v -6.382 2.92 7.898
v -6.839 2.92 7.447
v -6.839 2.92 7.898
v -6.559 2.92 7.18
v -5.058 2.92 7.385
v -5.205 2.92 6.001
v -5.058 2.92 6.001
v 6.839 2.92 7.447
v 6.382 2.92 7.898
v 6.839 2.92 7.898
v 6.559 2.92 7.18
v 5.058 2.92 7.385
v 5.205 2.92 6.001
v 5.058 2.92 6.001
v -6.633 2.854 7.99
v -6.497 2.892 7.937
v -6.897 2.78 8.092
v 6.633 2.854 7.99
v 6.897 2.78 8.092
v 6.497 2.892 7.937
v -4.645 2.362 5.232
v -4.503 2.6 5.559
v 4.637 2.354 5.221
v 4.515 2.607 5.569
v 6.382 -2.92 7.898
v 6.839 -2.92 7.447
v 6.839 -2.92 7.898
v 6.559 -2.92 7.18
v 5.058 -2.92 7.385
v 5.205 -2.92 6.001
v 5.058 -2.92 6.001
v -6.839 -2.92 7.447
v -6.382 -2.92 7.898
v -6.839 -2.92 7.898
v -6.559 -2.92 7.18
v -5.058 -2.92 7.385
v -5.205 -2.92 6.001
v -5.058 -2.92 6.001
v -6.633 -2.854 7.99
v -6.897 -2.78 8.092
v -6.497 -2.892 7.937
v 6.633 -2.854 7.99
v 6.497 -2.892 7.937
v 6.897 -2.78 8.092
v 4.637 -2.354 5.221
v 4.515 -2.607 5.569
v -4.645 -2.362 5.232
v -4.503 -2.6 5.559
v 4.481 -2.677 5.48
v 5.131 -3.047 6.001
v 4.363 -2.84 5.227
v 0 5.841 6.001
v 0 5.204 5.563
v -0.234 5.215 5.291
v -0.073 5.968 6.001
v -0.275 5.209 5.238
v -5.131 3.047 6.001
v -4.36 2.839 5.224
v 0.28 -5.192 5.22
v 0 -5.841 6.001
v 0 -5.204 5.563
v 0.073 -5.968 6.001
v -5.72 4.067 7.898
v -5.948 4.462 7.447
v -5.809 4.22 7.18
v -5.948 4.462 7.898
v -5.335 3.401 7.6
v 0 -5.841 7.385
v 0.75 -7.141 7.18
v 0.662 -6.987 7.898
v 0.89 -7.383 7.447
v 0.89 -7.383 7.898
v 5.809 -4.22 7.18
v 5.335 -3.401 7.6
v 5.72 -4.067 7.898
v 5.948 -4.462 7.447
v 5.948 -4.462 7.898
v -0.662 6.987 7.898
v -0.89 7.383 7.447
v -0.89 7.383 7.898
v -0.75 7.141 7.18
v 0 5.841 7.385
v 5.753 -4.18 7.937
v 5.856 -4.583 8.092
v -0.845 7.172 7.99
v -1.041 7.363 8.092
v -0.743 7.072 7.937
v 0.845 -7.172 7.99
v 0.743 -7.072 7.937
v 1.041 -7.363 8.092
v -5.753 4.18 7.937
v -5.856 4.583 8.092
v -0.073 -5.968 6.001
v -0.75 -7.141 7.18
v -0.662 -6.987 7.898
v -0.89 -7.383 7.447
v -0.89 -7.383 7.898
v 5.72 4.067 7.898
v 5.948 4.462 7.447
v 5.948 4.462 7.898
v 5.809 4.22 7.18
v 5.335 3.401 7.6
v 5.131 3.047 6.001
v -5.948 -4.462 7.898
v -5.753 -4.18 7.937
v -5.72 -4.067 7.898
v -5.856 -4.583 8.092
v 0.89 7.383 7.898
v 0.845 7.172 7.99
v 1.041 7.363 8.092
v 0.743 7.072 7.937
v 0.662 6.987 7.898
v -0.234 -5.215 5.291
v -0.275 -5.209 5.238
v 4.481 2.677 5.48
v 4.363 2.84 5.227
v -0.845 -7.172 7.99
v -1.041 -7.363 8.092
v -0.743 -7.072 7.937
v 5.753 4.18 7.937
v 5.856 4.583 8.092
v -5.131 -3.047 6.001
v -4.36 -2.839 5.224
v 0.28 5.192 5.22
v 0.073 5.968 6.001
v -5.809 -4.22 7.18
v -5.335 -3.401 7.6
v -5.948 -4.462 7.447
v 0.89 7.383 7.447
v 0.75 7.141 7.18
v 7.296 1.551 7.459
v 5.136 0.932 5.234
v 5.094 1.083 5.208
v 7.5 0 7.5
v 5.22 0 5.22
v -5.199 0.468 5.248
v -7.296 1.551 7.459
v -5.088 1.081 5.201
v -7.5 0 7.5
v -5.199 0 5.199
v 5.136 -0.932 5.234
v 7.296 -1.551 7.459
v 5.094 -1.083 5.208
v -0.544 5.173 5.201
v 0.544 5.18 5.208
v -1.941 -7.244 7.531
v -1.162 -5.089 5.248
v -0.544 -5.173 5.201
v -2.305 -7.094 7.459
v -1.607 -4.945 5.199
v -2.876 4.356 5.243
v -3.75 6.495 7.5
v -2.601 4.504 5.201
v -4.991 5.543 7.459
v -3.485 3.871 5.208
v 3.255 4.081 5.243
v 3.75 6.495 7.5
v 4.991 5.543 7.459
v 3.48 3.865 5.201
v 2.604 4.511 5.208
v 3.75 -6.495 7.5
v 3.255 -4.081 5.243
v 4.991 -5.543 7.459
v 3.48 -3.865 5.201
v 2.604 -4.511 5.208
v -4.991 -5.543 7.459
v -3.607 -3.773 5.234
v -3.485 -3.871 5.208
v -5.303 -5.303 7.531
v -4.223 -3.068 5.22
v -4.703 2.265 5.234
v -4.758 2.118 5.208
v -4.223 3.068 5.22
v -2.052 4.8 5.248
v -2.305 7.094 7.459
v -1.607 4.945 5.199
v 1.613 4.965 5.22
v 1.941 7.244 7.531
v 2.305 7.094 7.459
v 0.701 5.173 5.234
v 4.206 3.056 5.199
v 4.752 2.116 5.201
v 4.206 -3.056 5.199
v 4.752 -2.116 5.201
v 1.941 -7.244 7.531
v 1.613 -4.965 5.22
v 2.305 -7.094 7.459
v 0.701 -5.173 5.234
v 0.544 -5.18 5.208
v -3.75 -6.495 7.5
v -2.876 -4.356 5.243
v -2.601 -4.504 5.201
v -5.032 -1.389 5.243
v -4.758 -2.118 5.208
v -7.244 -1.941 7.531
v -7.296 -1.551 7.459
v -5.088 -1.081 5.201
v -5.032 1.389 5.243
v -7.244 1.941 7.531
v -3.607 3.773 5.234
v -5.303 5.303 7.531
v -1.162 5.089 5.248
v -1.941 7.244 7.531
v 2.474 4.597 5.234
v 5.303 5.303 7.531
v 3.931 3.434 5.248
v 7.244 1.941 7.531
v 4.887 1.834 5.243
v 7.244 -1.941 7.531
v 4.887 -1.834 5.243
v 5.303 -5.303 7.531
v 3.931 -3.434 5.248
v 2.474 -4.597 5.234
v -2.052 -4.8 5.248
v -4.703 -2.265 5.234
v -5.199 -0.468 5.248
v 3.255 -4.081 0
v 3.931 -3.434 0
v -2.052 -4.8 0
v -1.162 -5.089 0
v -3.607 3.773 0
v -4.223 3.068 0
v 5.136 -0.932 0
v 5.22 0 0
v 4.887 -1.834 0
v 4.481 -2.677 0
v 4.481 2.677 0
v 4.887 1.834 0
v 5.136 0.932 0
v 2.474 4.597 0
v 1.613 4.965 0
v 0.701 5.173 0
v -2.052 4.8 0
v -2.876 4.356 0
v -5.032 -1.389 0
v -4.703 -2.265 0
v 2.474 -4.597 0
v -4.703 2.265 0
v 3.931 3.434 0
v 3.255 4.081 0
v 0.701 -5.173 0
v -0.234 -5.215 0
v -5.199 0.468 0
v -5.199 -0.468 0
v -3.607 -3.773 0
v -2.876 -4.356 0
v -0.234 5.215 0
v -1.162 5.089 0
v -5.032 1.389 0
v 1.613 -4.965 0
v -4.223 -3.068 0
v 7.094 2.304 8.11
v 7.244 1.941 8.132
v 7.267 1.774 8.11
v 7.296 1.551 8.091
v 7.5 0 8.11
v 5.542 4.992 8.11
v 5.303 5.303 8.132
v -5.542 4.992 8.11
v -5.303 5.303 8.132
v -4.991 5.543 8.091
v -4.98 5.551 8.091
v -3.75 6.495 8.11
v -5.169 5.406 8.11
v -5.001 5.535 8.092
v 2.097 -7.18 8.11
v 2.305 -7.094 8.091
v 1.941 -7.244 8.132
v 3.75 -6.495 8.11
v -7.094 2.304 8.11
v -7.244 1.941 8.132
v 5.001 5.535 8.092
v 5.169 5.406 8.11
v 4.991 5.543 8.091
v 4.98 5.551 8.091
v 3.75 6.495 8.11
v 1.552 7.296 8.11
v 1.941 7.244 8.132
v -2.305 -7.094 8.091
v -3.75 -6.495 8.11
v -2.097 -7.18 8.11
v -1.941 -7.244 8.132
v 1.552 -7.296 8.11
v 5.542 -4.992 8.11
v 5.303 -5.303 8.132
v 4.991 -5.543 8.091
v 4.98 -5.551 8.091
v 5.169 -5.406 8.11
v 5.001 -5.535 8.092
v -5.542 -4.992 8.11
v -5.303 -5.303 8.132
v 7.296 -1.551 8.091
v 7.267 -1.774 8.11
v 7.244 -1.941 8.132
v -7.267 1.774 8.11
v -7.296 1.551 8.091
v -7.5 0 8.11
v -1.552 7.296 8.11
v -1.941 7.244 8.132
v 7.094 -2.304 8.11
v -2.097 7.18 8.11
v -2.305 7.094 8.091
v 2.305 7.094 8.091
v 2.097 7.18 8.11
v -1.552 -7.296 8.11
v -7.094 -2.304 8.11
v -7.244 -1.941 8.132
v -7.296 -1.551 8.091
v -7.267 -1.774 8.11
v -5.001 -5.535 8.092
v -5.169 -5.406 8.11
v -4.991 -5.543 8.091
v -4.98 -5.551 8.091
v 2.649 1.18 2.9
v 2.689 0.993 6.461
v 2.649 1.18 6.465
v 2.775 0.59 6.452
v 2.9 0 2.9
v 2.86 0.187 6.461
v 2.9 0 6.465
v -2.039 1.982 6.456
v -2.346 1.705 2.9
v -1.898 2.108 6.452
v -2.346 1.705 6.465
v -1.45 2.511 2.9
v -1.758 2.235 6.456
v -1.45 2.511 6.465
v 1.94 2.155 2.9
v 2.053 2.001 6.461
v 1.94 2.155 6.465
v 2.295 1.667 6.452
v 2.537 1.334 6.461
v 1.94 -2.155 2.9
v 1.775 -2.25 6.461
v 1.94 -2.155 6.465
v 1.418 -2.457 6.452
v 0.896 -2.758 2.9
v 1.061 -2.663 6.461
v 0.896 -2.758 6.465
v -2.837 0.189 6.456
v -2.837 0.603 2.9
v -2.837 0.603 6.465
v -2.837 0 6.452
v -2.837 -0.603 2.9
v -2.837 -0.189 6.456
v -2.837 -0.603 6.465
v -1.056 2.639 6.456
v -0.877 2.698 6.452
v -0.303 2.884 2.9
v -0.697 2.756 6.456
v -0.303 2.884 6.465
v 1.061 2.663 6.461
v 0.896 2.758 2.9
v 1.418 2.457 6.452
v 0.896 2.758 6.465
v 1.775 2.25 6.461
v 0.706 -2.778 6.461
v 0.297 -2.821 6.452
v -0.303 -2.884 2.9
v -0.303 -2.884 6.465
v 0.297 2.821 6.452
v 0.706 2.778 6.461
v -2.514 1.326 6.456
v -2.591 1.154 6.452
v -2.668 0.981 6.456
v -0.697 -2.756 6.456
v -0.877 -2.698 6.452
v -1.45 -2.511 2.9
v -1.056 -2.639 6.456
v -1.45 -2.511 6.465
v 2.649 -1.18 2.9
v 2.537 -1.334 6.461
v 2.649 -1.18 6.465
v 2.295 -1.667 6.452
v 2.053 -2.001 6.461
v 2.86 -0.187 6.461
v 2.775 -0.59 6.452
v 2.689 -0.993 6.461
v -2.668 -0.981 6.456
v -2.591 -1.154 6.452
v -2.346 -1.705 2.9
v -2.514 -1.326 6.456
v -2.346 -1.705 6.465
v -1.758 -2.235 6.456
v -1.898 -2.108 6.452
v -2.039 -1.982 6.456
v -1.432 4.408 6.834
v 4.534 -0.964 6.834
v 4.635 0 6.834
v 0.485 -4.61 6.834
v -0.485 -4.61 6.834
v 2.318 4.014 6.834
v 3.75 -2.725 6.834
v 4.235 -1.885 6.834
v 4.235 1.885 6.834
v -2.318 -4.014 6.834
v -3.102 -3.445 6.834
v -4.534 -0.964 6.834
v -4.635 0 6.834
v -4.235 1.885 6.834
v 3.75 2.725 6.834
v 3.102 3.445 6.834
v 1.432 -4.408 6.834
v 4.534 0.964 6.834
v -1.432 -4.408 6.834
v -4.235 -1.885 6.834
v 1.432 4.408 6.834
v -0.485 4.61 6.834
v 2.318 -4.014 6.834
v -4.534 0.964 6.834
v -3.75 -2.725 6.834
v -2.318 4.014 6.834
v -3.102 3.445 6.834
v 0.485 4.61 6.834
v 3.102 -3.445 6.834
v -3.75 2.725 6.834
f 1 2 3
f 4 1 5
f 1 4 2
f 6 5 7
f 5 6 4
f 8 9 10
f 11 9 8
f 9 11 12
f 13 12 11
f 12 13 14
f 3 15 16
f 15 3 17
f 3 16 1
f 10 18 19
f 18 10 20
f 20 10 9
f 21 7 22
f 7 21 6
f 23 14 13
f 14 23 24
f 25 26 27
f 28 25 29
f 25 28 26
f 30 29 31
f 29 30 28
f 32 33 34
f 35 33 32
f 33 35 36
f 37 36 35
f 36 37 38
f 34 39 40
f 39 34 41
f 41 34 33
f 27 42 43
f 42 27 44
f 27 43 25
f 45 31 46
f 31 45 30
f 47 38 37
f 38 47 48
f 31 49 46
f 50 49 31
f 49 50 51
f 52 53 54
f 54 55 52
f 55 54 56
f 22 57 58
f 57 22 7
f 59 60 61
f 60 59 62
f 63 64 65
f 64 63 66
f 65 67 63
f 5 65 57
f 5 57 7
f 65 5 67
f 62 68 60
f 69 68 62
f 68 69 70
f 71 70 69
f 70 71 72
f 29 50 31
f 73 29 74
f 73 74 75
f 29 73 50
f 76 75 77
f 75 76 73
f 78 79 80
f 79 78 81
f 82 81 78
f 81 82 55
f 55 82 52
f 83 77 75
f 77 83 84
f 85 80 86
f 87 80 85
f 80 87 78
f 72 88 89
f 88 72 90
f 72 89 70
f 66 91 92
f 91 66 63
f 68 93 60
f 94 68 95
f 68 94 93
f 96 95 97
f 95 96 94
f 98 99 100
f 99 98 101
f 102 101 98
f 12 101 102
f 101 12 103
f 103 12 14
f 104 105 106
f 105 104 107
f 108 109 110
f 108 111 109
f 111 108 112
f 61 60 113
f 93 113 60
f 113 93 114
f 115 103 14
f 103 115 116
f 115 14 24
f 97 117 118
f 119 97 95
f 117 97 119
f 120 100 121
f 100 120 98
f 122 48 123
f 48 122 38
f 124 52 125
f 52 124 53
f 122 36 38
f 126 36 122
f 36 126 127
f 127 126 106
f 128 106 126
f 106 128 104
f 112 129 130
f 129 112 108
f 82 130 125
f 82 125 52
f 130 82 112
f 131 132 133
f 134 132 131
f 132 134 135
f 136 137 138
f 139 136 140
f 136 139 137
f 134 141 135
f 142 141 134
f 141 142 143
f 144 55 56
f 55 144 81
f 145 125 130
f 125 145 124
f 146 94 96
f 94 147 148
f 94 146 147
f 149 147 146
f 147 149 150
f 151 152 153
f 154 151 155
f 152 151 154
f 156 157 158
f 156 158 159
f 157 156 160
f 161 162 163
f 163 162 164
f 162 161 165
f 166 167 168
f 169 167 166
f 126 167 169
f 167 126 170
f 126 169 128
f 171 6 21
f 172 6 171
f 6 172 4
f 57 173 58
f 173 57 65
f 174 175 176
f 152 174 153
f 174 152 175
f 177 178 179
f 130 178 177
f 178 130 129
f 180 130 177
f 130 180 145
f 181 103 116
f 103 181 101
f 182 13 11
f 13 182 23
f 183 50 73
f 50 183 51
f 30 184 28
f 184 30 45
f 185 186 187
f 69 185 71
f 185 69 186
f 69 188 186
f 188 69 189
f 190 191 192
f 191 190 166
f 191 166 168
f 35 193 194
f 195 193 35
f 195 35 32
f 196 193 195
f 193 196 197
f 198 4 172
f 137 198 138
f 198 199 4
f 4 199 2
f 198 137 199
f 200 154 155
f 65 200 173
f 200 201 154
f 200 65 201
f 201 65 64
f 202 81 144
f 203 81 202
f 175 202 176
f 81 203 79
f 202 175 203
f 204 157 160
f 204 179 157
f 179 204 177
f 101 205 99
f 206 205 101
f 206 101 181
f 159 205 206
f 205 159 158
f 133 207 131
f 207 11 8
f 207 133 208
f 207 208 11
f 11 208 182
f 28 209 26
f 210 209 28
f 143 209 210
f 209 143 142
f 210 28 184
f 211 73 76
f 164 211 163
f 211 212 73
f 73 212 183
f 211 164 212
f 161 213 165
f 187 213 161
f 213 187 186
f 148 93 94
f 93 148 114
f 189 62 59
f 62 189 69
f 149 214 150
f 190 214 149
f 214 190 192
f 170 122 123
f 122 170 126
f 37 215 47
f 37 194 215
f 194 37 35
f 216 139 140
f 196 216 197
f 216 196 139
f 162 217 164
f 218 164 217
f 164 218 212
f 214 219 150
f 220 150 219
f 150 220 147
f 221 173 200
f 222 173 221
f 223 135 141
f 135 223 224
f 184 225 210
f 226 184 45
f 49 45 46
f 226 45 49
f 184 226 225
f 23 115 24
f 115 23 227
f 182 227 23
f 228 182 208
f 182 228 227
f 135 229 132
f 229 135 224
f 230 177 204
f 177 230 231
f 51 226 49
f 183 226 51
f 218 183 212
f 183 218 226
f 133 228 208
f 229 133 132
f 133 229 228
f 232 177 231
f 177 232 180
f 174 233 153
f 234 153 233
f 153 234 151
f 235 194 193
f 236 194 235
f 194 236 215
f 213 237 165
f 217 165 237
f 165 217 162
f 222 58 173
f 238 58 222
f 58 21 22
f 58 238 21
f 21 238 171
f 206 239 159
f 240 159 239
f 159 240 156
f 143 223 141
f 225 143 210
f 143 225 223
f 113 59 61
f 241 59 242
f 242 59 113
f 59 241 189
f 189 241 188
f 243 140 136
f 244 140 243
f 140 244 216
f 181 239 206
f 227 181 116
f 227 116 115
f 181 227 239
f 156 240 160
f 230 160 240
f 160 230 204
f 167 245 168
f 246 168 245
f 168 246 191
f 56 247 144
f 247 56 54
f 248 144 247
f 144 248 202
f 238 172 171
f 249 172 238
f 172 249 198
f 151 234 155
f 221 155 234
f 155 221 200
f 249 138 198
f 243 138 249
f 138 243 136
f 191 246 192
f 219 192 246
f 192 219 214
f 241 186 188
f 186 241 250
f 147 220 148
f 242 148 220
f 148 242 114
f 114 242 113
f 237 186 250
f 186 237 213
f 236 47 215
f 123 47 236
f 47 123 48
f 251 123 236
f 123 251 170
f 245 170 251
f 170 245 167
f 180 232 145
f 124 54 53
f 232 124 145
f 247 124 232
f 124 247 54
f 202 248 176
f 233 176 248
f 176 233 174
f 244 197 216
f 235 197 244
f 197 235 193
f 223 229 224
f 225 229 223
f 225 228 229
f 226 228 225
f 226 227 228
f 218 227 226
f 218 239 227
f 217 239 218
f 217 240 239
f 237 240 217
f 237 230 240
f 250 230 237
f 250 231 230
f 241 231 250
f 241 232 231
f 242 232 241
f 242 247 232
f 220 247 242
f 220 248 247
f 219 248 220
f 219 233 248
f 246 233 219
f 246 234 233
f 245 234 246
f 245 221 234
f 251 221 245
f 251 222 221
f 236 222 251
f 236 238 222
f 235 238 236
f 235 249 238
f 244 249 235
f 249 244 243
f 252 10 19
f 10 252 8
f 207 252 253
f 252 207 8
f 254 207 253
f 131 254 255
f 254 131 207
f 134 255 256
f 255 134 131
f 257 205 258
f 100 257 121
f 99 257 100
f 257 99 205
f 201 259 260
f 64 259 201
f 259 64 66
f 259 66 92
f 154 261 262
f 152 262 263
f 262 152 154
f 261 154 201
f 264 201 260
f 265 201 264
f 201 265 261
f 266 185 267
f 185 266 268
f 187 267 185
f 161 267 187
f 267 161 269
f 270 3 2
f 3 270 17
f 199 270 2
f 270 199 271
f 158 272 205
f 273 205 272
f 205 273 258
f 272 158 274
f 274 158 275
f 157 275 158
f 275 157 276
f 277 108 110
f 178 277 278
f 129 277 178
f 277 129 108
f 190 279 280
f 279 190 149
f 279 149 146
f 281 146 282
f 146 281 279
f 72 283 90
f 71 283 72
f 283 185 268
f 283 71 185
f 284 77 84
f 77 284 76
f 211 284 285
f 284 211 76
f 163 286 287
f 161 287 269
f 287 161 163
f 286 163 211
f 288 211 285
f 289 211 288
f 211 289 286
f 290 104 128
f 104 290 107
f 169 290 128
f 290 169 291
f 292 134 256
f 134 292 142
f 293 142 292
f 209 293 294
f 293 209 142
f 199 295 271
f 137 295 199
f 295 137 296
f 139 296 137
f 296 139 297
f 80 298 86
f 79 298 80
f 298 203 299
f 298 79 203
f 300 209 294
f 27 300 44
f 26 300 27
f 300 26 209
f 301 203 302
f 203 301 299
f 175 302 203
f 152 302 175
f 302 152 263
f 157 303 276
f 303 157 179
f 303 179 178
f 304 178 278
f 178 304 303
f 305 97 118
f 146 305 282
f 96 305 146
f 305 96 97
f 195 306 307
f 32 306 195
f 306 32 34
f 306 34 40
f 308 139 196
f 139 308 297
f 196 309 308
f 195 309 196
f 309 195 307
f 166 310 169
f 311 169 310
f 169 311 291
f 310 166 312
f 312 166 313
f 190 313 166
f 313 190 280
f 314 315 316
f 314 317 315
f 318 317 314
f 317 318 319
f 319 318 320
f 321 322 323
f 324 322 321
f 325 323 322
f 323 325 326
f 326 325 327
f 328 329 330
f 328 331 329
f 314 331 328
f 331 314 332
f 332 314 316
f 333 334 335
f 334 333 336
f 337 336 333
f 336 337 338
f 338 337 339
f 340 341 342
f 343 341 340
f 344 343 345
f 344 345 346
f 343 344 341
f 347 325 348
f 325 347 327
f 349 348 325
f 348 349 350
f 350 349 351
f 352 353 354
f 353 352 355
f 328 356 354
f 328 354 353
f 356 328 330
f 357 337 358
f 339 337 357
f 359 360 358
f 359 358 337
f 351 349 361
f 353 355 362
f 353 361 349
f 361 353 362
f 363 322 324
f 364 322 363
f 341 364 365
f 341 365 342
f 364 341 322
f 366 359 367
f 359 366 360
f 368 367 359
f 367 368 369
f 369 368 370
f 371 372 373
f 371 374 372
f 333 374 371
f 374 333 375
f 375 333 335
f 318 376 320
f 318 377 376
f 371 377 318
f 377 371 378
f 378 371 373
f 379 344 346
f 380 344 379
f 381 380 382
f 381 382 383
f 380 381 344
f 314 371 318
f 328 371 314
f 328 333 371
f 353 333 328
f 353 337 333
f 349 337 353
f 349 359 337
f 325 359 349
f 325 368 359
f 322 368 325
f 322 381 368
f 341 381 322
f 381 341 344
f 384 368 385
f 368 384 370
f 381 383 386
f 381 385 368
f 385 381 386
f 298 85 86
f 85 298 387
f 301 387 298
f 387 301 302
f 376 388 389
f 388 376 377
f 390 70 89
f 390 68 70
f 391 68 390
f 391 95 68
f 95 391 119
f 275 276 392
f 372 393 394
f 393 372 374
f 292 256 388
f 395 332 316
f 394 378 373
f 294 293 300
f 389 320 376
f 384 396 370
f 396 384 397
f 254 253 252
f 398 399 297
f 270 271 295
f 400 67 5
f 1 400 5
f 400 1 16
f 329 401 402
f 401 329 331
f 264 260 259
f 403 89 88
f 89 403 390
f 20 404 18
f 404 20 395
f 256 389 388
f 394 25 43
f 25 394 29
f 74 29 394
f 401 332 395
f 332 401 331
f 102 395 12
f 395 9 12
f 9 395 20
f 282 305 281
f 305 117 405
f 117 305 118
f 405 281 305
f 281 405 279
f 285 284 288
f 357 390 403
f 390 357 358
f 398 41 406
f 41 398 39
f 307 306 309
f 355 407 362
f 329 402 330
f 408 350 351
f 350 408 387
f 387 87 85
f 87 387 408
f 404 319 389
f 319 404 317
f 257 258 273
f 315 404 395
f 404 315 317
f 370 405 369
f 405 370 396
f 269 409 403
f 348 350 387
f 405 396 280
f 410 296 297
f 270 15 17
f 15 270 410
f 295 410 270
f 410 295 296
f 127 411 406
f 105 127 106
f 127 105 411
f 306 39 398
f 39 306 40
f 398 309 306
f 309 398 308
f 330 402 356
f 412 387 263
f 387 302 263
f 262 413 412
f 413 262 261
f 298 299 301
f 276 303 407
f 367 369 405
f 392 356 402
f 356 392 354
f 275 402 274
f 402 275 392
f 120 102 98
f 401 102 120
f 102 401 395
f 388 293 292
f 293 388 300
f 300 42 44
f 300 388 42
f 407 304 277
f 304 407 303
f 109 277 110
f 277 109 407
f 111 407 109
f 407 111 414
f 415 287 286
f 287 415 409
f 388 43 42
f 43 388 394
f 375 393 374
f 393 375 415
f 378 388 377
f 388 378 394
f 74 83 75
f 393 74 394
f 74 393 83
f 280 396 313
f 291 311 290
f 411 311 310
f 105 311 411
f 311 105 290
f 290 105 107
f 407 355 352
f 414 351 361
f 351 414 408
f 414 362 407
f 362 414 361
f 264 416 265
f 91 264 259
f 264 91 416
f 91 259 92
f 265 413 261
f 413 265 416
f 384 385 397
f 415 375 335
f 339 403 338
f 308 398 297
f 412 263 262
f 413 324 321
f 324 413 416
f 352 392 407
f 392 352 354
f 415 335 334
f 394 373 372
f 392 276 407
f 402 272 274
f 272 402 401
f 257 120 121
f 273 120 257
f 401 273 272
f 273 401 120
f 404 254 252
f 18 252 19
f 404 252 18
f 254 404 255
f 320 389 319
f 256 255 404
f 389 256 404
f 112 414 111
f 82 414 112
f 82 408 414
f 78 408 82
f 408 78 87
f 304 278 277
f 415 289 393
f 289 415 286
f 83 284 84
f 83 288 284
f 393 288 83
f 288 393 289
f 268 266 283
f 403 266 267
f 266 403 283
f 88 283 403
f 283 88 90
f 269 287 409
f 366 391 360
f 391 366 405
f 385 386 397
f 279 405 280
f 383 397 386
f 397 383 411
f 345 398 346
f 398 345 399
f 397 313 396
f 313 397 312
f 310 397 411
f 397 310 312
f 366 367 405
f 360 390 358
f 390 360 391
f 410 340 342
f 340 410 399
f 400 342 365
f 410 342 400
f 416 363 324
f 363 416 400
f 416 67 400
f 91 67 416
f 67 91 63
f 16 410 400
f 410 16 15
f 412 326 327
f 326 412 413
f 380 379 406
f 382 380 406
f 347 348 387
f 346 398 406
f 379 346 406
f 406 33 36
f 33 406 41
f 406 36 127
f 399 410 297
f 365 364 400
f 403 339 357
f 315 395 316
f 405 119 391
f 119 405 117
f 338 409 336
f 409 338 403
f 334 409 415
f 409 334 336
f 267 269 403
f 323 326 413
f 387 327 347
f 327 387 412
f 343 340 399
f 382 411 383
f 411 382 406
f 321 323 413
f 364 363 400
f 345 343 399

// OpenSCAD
// [FL_INDEX: keywords="openscad, 3d_parametric, Customizable_birthday_candle_holder, csg_solid" | COT="Parametric OpenSCAD design from 3DCodeverse"]
// Title: Customizable birthday candle holder

// Birthday candle holder by teejaydub

// preview[view:north, tilt:top]
/* [Global] */

// The diameter of the birthday candle [mm]
CANDLE_DIAMETER = 5.8;  //first try: 5.3, too small; 5.5 - 5.7, works but tight

// The outer diameter of the candle holder [mm]
OUTER_DIAMETER = 15;

/* [Hidden] */

CANDLE_RADIUS = CANDLE_DIAMETER / 2;
OUTER_RADIUS = OUTER_DIAMETER / 2;

HOLE_HEIGHT = CANDLE_RADIUS * 5;  // of the cutting hole object
CANDLE_HEIGHT = CANDLE_RADIUS;  // height of the candle above the floor
CANDLE_DEPTH = CANDLE_RADIUS * 1;  // how much the candle is buried in the holder

BASE_HEIGHT = CANDLE_HEIGHT + CANDLE_DEPTH;  // of the base object
BASE_RADIUS = CANDLE_RADIUS * 1.8;

PETAL_RADIUS = BASE_RADIUS / 1.7;

BOWL_RADIUS = OUTER_DIAMETER;

difference() {
	intersection() {
		union() {
			// Base
			translate([0, 0, BASE_HEIGHT / 2])
				cylinder(h = BASE_HEIGHT, r = BASE_RADIUS, center = true, $fn=35);
	
			// Flowers
			intersection() {
				union() {
					petal(0);
					petal(120);
					petal(240);
				}

				// Enforce a 45-degree angle on the petals so no support is needed.
				translate([0, 0, 50])
					cylinder(h = 100, r1 = 0, r2 = 100, center = true);
			}
		}

		// We want a circular outline.
		cylinder(h = 100, r = OUTER_RADIUS, center = true);
	}

	// Hole for the candle
	translate([0, 0, CANDLE_HEIGHT + HOLE_HEIGHT / 2])
		cylinder(h = HOLE_HEIGHT, r = CANDLE_RADIUS, center = true, $fn=15);

	// Shallow bowl
	translate([0, 0, BOWL_RADIUS + BASE_HEIGHT + 0.3])
		sphere(r = BOWL_RADIUS, center = true);
}

module petal(angle) {
	translate([0, 0, BASE_HEIGHT + PETAL_RADIUS * 0.7 - 1])
	rotate([0, 90, angle])
		cylinder(h = OUTER_DIAMETER, r = PETAL_RADIUS, center = true);
}
